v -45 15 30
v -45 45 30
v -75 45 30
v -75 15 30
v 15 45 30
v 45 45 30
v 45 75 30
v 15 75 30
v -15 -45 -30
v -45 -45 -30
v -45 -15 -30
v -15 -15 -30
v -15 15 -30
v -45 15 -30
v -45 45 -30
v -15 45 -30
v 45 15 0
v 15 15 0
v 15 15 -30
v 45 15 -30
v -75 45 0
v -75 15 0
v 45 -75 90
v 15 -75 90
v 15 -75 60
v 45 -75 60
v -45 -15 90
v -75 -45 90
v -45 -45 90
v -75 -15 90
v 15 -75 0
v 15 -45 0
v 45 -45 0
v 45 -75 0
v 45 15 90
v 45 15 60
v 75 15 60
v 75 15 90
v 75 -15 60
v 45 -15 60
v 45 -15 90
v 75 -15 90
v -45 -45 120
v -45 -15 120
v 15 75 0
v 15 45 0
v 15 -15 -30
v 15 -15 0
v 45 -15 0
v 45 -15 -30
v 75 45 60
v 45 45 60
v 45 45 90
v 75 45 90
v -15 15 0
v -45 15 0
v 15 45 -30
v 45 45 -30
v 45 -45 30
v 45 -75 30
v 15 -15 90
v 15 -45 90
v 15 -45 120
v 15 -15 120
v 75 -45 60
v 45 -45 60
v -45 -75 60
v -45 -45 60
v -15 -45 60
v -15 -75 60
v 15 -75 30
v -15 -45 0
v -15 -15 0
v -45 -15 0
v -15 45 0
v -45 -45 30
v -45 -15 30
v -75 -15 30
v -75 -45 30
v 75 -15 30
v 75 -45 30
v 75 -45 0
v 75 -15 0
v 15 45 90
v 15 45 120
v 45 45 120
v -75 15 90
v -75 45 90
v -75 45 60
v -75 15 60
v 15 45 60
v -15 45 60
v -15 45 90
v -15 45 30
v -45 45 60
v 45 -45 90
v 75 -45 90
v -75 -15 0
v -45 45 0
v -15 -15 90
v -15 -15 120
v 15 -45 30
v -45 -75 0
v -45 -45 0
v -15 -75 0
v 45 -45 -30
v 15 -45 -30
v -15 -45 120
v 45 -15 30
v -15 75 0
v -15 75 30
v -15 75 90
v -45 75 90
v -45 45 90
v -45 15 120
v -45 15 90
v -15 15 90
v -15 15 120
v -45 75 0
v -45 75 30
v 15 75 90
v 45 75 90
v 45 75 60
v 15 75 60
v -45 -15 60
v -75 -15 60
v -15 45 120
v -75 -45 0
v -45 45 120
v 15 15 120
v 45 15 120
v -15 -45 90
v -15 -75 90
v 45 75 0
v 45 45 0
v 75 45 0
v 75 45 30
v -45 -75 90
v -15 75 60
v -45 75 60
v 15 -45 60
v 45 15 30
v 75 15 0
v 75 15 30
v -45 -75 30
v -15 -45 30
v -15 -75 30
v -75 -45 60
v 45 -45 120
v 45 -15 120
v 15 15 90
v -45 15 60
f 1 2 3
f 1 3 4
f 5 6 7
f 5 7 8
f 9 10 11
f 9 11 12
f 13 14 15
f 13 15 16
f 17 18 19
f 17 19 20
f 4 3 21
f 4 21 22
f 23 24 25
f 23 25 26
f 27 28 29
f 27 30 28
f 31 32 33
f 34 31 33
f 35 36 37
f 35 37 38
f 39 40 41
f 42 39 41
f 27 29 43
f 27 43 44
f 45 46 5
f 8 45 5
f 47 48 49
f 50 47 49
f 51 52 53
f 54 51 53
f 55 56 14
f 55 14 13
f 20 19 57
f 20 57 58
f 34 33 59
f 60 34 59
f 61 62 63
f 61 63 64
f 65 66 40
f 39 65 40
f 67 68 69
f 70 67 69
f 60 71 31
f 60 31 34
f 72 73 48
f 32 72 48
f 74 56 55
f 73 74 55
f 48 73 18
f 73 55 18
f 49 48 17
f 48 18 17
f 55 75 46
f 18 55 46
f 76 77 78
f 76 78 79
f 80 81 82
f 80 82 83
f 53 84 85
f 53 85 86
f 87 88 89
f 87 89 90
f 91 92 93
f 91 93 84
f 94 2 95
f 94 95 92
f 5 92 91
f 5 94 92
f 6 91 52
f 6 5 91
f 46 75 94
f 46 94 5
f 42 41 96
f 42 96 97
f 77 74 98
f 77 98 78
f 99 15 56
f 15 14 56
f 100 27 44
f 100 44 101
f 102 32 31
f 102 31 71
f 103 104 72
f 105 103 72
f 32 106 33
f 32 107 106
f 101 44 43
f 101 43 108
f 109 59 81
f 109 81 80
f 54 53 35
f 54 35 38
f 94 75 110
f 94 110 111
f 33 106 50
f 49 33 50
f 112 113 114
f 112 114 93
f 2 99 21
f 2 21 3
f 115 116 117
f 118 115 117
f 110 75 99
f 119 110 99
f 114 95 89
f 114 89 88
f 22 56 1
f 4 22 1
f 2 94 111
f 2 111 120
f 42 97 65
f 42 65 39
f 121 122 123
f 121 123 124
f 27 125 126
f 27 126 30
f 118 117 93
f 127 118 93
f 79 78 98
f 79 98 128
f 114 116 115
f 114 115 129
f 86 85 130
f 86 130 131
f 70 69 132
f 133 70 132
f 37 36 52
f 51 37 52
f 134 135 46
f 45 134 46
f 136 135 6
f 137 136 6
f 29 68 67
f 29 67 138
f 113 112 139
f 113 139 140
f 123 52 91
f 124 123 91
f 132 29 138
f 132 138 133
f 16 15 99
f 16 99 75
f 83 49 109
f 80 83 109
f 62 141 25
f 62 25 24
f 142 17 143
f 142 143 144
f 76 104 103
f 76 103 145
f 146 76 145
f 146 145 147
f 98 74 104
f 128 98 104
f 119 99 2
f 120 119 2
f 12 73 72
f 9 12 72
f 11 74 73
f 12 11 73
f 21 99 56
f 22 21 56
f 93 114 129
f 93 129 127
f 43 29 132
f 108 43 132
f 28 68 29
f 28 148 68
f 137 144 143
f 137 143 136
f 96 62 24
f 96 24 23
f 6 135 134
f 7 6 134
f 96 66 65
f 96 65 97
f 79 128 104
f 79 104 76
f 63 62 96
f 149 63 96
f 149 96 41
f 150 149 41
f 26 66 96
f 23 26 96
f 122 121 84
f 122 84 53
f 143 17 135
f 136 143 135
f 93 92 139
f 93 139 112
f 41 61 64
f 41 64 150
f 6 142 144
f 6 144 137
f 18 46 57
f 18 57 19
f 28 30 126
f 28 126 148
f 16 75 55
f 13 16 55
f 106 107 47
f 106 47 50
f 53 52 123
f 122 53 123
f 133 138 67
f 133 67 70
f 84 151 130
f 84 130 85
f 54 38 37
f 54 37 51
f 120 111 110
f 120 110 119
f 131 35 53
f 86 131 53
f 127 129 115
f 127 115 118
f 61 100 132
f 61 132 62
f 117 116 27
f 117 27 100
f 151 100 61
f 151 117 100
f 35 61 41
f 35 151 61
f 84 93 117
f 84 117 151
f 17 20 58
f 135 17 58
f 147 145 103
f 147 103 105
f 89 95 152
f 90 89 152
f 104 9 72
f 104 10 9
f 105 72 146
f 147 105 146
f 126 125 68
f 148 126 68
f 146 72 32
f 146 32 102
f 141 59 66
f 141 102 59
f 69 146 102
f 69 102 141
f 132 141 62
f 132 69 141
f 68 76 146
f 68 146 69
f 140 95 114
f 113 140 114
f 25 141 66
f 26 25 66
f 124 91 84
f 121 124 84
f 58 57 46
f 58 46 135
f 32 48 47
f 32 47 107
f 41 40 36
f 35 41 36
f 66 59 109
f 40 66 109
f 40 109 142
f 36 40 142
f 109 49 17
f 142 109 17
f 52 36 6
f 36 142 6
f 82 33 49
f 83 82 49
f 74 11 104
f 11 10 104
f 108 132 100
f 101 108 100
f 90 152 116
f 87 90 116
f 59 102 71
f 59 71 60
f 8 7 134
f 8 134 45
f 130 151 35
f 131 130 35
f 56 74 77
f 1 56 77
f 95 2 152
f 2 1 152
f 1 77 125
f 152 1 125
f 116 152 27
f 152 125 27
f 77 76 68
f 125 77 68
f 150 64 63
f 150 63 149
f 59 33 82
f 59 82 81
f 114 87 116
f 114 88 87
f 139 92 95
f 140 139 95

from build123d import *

# Parameters (mm, degrees)
F0_W      = 90
F0_H      = 90
F1_DEPTH  = 90
F2_W      = 30
F2_H      = 30
F3_DEPTH  = 30
F4_W      = 30
F4_H      = 30
F5_DEPTH  = 30
F6_W      = 30
F6_H      = 30
F7_DEPTH  = 30
F8_W      = 30
F8_H      = 30
F9_DEPTH  = 30
F10_W     = 30
F10_H     = 30
F11_DEPTH = 30
F12_W     = 30
F12_H     = 30
F13_DEPTH = 30


with BuildPart() as f1:
    # F0 (on Top) → F1 (new body)
    with BuildSketch(Plane.XY):
        Rectangle(F0_W, F0_H)
    extrude(amount=F1_DEPTH)

    # F2 (on face) → F3 (join)
    with BuildSketch(Plane(origin=(0, 0, 0), x_dir=(1, 0, 0), z_dir=(0, 0, -1))):
        with Locations((-30, 30)):
            Rectangle(F2_W, F2_H)
        with Locations((30, 30)):
            Rectangle(F2_W, F2_H)
        with Locations((-30, -30)):
            Rectangle(F2_W, F2_H)
        with Locations((30, -30)):
            Rectangle(F2_W, F2_H)
    extrude(amount=F3_DEPTH)

    # F4 (on face) → F5 (join)
    with BuildSketch(Plane(origin=(0, 45, 0), x_dir=(-1, 0, 0), z_dir=(0, 1, 0))):
        with Locations((30, 75)):
            Rectangle(F4_W, F4_H)
        with Locations((-30, 75)):
            Rectangle(F4_W, F4_H)
        with Locations((-30, 15)):
            Rectangle(F4_W, F4_H)
        with Locations((30, 15)):
            Rectangle(F4_W, F4_H)
    extrude(amount=F5_DEPTH)

    # F6 (on face) → F7 (join)
    with BuildSketch(Plane(origin=(-45, 0, 0), x_dir=(0, -1, 0), z_dir=(-1, 0, 0))):
        with Locations((-30, 75)):
            Rectangle(F6_W, F6_H)
        with Locations((-30, 15)):
            Rectangle(F6_W, F6_H)
        with Locations((30, 15)):
            Rectangle(F6_W, F6_H)
        with Locations((30, 75)):
            Rectangle(F6_W, F6_H)
    extrude(amount=F7_DEPTH)

    # F8 (on face) → F9 (join)
    with BuildSketch(Plane.YZ.offset(45)):
        with Locations((-30, 75)):
            Rectangle(F8_W, F8_H)
        with Locations((-30, 15)):
            Rectangle(F8_W, F8_H)
        with Locations((30, 15)):
            Rectangle(F8_W, F8_H)
        with Locations((30, 75)):
            Rectangle(F8_W, F8_H)
    extrude(amount=F9_DEPTH)

    # F10 (on face) → F11 (join)
    with BuildSketch(Plane.XZ.offset(45)):
        with Locations((-30, 75)):
            Rectangle(F10_W, F10_H)
        with Locations((-30, 15)):
            Rectangle(F10_W, F10_H)
        with Locations((30, 15)):
            Rectangle(F10_W, F10_H)
        with Locations((30, 75)):
            Rectangle(F10_W, F10_H)
    extrude(amount=F11_DEPTH)

    # F12 (on face) → F13 (join)
    with BuildSketch(Plane.XY.offset(90)):
        with Locations((-30, 30)):
            Rectangle(F12_W, F12_H)
        with Locations((-30, -30)):
            Rectangle(F12_W, F12_H)
        with Locations((30, -30)):
            Rectangle(F12_W, F12_H)
        with Locations((30, 30)):
            Rectangle(F12_W, F12_H)
    extrude(amount=F13_DEPTH)


solid = f1.part
